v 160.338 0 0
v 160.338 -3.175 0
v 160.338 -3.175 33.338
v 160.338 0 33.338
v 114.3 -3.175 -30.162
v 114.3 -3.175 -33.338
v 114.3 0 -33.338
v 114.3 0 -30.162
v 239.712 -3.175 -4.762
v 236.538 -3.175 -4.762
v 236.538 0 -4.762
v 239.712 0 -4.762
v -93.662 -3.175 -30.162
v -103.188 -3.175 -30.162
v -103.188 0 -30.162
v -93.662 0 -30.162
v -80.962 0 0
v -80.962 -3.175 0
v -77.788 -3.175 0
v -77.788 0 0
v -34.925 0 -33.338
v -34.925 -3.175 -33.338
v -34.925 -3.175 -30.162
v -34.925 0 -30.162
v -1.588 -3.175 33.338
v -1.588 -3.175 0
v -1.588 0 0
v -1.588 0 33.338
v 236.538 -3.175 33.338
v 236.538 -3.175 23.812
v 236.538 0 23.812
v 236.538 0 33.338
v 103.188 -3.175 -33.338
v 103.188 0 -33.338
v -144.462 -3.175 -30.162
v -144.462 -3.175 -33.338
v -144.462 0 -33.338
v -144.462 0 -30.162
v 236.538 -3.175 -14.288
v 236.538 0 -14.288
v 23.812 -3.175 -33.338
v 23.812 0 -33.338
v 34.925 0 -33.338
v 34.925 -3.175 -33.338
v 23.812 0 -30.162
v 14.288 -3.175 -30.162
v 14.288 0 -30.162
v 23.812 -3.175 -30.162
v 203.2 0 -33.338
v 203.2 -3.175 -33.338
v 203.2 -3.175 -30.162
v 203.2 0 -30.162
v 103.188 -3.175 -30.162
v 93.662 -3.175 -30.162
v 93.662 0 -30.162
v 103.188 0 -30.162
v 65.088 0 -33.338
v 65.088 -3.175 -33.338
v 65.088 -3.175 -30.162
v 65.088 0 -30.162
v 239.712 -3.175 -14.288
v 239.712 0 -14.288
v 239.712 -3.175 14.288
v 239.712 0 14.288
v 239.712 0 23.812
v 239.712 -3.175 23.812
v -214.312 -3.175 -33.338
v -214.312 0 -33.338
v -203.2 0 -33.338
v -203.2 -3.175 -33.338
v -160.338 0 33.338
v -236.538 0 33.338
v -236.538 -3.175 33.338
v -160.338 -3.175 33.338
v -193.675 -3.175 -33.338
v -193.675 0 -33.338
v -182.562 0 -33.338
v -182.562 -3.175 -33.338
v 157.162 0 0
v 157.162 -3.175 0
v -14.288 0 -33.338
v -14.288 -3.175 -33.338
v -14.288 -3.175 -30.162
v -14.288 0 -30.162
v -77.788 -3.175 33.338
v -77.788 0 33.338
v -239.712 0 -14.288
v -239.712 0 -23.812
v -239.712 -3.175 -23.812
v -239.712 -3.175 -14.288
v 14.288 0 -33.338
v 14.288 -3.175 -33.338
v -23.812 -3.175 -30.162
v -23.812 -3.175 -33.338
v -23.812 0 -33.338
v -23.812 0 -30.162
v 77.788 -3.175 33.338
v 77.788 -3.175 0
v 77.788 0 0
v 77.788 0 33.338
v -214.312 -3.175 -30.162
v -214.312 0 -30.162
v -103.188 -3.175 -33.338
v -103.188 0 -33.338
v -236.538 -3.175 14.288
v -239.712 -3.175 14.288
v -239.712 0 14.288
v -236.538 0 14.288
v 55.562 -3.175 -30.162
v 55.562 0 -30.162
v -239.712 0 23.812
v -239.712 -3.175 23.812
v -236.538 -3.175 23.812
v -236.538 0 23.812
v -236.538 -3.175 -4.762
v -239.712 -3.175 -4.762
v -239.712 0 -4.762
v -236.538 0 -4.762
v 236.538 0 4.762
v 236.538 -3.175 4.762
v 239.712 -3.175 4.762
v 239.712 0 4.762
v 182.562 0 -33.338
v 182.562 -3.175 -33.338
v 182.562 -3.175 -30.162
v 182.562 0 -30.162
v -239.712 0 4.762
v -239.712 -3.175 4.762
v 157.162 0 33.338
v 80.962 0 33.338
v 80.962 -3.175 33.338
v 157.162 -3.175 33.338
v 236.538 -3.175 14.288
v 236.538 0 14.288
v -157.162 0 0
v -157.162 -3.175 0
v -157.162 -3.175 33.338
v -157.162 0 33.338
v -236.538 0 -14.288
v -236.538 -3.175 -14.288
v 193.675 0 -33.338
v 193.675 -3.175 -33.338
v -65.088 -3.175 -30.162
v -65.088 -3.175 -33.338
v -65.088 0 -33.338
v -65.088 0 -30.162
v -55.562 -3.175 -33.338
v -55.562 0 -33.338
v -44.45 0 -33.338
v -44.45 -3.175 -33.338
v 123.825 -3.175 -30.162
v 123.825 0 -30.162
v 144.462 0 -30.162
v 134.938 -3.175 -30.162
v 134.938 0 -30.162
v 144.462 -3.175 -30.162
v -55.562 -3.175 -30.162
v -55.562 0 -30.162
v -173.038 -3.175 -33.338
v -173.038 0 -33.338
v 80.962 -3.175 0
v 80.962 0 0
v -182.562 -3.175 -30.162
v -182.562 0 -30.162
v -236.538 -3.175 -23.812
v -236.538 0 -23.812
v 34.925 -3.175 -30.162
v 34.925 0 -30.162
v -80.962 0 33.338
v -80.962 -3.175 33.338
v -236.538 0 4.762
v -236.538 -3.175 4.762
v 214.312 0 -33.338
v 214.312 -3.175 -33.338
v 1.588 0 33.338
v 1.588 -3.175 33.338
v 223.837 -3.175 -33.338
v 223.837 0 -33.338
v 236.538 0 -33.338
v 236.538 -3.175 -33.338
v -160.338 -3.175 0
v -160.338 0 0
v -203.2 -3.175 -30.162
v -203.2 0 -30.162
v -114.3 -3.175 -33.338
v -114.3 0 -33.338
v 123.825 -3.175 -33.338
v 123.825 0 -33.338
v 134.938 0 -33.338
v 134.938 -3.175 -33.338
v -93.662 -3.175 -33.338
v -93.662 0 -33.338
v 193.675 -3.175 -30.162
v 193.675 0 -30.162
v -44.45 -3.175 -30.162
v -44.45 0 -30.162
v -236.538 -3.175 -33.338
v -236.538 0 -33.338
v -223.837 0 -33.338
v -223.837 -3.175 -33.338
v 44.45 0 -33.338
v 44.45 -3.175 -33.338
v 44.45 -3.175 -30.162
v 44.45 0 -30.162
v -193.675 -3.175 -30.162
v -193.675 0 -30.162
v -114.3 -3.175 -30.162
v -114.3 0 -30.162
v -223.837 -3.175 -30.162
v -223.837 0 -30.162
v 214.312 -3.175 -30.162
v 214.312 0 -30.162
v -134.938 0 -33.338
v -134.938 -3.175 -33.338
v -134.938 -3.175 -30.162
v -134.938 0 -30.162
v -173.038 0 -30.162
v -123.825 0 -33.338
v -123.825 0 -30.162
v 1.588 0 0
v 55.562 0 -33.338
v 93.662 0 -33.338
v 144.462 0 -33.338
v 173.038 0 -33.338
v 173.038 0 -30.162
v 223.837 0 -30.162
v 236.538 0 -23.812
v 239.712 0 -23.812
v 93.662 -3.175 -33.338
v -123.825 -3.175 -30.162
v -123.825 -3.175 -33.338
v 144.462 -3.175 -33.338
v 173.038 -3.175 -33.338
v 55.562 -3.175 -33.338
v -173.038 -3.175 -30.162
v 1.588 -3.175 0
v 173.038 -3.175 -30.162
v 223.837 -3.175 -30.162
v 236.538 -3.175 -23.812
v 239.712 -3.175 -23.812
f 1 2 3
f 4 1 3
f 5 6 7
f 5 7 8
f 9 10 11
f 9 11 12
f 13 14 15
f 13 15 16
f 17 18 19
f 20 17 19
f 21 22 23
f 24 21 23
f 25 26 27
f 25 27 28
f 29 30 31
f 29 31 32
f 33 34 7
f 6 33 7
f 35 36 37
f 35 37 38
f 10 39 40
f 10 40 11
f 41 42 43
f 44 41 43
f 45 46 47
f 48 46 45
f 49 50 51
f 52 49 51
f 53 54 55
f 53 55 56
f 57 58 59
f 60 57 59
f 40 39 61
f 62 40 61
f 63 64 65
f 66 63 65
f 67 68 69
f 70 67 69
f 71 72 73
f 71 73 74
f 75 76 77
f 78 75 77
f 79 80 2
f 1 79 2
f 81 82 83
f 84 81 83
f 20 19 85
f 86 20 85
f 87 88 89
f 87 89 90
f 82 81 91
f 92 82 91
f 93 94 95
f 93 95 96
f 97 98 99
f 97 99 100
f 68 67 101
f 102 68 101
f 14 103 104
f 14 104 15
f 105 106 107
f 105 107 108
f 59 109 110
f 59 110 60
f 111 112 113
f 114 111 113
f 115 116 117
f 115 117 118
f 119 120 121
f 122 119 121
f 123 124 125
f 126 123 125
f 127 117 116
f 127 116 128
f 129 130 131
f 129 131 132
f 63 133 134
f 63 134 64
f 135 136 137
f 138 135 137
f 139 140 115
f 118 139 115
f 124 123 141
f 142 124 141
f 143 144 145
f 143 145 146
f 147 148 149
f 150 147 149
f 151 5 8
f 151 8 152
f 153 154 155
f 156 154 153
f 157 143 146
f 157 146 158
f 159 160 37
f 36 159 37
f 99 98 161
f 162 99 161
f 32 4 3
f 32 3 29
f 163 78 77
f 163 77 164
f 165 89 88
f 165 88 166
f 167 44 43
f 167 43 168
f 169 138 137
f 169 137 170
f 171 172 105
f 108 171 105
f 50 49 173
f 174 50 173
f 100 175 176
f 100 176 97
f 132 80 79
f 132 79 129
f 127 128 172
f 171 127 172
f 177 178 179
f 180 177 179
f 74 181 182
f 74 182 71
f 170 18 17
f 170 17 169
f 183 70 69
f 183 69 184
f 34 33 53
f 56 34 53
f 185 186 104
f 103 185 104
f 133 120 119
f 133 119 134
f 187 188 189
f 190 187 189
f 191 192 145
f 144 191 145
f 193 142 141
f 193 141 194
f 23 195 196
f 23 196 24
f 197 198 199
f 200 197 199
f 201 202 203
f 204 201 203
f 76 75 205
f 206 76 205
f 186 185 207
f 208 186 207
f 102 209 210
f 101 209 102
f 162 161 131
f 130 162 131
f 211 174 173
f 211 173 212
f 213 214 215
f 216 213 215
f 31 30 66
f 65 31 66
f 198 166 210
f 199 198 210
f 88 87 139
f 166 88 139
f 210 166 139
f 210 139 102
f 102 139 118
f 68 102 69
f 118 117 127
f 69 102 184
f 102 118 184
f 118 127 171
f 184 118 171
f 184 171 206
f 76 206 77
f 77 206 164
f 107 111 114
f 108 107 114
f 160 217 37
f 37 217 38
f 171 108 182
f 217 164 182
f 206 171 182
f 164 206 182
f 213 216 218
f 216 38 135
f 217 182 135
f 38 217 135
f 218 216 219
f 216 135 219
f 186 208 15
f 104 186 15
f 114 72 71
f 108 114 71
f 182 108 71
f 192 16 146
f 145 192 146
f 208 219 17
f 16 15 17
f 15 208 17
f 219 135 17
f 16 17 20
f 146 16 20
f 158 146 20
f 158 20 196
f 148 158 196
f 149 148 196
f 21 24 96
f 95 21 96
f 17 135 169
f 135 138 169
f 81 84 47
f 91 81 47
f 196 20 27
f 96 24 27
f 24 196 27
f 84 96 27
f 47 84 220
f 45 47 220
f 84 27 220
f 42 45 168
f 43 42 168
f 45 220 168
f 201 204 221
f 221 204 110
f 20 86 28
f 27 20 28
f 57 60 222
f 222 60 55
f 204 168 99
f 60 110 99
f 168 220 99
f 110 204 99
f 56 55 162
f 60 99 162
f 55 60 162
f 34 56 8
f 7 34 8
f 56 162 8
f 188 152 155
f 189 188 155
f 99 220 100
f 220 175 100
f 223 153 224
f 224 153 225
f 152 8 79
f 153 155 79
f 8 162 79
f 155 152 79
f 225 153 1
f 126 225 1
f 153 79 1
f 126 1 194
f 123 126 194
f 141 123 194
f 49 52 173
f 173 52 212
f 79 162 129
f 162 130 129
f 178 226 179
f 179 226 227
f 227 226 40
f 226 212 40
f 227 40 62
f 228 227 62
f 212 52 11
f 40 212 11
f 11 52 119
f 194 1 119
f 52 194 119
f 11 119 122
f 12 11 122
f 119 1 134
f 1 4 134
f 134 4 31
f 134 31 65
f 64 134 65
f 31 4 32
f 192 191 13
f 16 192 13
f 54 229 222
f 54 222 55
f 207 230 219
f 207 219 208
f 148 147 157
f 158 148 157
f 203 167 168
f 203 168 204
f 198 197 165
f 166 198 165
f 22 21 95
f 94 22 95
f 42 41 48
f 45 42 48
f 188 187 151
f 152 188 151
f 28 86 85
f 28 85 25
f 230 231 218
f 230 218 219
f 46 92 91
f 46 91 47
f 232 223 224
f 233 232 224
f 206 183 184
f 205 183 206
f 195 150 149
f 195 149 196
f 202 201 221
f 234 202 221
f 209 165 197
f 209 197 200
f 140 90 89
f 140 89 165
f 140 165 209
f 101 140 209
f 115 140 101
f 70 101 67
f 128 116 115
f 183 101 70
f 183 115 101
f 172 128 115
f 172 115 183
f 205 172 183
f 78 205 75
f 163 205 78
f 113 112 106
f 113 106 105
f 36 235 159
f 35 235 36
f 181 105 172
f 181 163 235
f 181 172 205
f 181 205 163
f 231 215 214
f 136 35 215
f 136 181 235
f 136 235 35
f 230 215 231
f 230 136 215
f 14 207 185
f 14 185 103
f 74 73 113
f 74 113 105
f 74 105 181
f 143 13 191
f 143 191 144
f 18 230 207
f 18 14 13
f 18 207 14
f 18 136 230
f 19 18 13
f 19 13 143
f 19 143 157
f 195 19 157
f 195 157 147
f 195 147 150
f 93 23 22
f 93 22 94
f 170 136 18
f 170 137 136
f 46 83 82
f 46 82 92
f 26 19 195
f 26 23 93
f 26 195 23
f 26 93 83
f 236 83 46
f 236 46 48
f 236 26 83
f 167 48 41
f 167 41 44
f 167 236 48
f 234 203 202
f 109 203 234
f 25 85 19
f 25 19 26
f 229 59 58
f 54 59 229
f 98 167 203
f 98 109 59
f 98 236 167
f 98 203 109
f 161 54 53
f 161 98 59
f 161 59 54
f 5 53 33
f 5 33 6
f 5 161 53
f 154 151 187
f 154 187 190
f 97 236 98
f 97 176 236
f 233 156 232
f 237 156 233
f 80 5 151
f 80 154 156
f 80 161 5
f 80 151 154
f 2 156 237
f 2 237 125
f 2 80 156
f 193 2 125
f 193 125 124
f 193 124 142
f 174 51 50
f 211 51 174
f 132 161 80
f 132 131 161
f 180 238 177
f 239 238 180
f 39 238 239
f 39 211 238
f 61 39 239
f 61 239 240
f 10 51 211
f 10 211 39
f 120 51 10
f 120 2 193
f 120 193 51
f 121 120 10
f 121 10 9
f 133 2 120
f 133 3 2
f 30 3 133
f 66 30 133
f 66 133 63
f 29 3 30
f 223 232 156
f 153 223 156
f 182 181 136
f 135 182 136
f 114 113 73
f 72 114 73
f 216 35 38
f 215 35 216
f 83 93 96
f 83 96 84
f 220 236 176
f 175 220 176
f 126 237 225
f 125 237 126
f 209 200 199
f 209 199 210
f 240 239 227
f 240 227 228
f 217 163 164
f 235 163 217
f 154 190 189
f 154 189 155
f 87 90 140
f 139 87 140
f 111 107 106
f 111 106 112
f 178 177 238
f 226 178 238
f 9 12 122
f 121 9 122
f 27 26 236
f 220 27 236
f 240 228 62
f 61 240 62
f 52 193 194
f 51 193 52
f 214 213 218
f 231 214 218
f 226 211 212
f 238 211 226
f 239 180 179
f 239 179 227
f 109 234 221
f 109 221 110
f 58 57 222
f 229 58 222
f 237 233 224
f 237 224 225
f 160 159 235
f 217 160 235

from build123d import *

# Parameters (mm, degrees)
F0_W     = 479.425
F0_H     = 66.675
F1_DEPTH = 3.175
F2_W     = 3.175
F2_H     = 9.525
F3_DEPTH = 3.176
F4_W     = 3.175
F4_H     = 33.3375
F5_DEPTH = 3.176
F6_W     = 9.525
F6_H     = 3.175
F7_DEPTH = 3.176


with BuildPart() as f1:
    # F0 (on Front) → F1 (new body)
    with BuildSketch(Plane.XZ):
        Rectangle(F0_W, F0_H)
    extrude(amount=F1_DEPTH)

    # F2 (on face) → F3 (cut, through all)
    with BuildSketch(Plane.XZ.offset(3.175)):
        with Locations((-238.125, -28.575)):
            Rectangle(F2_W, F2_H)
        with Locations((-238.125, -9.525)):
            Rectangle(F2_W, F2_H)
        with Locations((-238.125, 9.525)):
            Rectangle(F2_W, F2_H)
        with Locations((-238.125, 28.575)):
            Rectangle(F2_W, F2_H)
        with Locations((238.125, -28.575)):
            Rectangle(F2_W, F2_H)
        with Locations((238.125, -9.525)):
            Rectangle(F2_W, F2_H)
        with Locations((238.125, 9.525)):
            Rectangle(F2_W, F2_H)
        with Locations((238.125, 28.575)):
            Rectangle(F2_W, F2_H)
    extrude(amount=-F3_DEPTH, mode=Mode.SUBTRACT)

    # F4 (on face) → F5 (cut, through all)
    with BuildSketch(Plane.XZ.offset(3.175)):
        with Locations((-158.75, 16.66875)):
            Rectangle(F4_W, F4_H)
        with Locations((-79.375, 16.66875)):
            Rectangle(F4_W, F4_H)
        with Locations((0, 16.66875)):
            Rectangle(F4_W, F4_H)
        with Locations((79.375, 16.66875)):
            Rectangle(F4_W, F4_H)
        with Locations((158.75, 16.66875)):
            Rectangle(F4_W, F4_H)
    extrude(amount=-F5_DEPTH, mode=Mode.SUBTRACT)

    # F6 (on face) → F7 (cut, through all)
    with BuildSketch(Plane.XZ.offset(3.175)):
        with Locations((-219.075, -31.75)):
            Rectangle(F6_W, F6_H)
        with Locations((-198.4375, -31.75)):
            Rectangle(F6_W, F6_H)
        with Locations((-177.8, -31.75)):
            Rectangle(F6_W, F6_H)
        with Locations((-139.7, -31.75)):
            Rectangle(F6_W, F6_H)
        with Locations((-119.0625, -31.75)):
            Rectangle(F6_W, F6_H)
        with Locations((-98.425, -31.75)):
            Rectangle(F6_W, F6_H)
        with Locations((-60.325, -31.75)):
            Rectangle(F6_W, F6_H)
        with Locations((-39.6875, -31.75)):
            Rectangle(F6_W, F6_H)
        with Locations((-19.05, -31.75)):
            Rectangle(F6_W, F6_H)
        with Locations((19.05, -31.75)):
            Rectangle(F6_W, F6_H)
        with Locations((39.6875, -31.75)):
            Rectangle(F6_W, F6_H)
        with Locations((60.325, -31.75)):
            Rectangle(F6_W, F6_H)
        with Locations((98.425, -31.75)):
            Rectangle(F6_W, F6_H)
        with Locations((119.0625, -31.75)):
            Rectangle(F6_W, F6_H)
        with Locations((139.7, -31.75)):
            Rectangle(F6_W, F6_H)
        with Locations((177.8, -31.75)):
            Rectangle(F6_W, F6_H)
        with Locations((198.4375, -31.75)):
            Rectangle(F6_W, F6_H)
        with Locations((219.075, -31.75)):
            Rectangle(F6_W, F6_H)
    extrude(amount=-F7_DEPTH, mode=Mode.SUBTRACT)


solid = f1.part
